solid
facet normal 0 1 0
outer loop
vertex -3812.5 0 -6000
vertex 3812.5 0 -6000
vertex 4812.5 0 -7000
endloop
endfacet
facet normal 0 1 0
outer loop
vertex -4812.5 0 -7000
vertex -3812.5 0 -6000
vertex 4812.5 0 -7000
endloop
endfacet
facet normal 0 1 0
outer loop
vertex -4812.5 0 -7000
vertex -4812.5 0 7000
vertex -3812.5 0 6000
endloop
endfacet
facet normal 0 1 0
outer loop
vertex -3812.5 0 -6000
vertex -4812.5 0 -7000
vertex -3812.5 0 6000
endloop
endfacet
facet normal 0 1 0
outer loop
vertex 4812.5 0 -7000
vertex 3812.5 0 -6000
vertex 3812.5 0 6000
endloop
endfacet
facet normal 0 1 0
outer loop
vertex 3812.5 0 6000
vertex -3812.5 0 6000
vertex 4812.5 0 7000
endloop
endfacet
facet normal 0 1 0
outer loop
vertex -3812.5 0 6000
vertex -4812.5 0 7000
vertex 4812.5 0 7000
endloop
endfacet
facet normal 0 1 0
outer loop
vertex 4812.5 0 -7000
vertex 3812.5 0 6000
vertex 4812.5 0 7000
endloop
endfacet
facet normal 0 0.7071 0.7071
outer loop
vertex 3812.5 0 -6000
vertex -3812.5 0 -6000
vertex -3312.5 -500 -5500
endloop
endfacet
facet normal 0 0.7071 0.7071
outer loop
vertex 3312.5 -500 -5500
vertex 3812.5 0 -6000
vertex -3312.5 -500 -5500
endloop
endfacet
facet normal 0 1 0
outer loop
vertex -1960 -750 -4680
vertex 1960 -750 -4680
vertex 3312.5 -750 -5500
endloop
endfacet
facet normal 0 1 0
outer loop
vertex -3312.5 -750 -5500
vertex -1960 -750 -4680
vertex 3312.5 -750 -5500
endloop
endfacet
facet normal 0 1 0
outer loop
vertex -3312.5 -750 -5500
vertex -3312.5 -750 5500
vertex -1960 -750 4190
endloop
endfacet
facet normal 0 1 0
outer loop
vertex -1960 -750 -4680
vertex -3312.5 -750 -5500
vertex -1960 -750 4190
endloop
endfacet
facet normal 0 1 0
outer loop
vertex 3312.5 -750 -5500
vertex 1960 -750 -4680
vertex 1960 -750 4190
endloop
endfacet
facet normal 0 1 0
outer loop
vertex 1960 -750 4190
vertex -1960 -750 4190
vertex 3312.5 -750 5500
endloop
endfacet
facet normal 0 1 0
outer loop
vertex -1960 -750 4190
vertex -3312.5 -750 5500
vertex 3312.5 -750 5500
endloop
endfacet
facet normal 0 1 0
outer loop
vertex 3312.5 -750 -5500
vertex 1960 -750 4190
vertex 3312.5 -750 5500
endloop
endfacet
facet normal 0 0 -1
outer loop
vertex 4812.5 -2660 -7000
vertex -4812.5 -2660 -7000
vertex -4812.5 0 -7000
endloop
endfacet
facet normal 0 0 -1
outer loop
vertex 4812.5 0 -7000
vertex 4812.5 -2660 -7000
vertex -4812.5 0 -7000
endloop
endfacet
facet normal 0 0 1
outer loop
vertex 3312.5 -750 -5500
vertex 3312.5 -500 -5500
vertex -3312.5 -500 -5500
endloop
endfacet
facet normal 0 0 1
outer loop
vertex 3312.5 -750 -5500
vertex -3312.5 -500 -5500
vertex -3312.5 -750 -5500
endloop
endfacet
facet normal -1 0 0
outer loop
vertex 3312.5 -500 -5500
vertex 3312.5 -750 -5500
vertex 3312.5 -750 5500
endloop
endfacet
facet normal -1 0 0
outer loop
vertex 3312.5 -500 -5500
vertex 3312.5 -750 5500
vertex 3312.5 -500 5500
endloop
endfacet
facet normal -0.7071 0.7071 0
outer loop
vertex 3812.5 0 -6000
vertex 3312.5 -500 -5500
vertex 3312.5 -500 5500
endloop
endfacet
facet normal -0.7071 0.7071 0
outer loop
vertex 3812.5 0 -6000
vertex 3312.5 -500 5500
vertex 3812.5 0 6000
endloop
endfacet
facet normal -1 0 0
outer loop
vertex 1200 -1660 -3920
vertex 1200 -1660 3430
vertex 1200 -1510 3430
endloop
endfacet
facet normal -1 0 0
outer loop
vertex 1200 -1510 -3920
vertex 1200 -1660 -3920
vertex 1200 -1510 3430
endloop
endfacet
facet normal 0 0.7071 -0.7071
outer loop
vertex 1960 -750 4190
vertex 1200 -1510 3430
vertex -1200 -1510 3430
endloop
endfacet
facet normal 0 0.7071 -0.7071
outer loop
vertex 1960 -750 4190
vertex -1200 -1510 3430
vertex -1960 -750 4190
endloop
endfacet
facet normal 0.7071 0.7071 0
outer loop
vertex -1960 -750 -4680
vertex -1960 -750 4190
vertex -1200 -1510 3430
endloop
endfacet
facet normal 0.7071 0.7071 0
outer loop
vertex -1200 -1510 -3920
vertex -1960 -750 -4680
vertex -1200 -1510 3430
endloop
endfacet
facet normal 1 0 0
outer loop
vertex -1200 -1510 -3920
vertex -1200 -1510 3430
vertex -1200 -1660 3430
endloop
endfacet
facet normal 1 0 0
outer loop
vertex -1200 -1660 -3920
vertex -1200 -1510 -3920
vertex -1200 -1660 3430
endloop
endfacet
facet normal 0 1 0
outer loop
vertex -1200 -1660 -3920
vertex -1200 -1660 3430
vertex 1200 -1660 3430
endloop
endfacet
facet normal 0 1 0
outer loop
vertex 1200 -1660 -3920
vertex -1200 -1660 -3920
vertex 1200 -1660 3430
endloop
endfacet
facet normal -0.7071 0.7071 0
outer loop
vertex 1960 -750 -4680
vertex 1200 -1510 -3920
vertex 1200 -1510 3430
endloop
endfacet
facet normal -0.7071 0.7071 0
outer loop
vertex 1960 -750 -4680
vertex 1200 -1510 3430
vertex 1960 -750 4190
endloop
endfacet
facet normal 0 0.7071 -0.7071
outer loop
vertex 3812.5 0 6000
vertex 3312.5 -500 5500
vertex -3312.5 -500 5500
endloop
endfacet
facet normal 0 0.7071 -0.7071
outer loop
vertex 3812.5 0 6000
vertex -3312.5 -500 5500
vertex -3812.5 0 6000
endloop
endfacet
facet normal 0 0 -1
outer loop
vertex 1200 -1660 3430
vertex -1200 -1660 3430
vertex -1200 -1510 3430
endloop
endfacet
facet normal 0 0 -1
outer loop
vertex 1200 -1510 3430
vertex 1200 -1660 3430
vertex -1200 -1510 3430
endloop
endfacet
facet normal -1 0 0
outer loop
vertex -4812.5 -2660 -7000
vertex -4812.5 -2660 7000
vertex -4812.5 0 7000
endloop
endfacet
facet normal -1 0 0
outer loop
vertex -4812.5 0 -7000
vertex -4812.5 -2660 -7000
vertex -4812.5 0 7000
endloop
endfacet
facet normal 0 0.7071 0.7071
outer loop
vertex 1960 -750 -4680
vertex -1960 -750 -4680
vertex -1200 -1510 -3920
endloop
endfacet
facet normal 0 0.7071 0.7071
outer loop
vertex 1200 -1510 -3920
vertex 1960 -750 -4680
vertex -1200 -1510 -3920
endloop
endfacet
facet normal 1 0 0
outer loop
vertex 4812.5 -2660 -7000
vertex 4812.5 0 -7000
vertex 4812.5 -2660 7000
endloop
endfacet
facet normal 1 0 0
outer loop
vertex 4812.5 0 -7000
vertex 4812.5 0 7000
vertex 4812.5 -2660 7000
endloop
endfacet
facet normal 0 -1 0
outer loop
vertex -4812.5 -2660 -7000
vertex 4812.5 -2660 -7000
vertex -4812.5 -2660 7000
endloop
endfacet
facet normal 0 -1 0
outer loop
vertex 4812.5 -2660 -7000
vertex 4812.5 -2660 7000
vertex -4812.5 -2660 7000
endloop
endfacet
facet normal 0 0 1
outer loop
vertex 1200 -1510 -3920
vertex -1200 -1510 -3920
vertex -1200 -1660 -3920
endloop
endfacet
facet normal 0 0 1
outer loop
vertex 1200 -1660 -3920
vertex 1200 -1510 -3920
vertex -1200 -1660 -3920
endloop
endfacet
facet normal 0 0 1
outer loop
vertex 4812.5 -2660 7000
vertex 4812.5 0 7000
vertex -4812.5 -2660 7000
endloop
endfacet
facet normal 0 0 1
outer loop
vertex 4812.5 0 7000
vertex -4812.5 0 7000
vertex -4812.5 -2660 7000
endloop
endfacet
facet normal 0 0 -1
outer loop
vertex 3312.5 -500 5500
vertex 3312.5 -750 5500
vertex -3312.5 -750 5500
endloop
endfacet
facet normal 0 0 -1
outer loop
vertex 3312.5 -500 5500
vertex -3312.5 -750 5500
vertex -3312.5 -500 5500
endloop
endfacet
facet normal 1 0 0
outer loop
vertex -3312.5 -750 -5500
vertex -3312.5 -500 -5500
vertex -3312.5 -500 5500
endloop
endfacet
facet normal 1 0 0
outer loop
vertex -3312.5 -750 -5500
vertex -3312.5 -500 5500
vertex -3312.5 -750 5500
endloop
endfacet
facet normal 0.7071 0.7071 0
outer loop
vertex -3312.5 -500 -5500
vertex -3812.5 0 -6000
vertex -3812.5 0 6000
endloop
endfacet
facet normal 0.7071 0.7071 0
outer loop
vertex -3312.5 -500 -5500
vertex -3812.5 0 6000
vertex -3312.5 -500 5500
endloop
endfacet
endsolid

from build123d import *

# Parameters (mm, degrees)
EXTRUDE_1_DEPTH = 7000
EXTRUDE_2_REACH = 12196.926


with BuildPart() as part:
    # Эскиз1 → Бобышка-Вытянуть1 (new body)
    with BuildSketch(Plane.XY):
        Polygon((-1200, -1660), (1200, -1660), (1200, -1510), (1960, -750), (3312.5, -750), (3312.5, -500), (3812.5, 0), (4812.5, 0), (4812.5, -2660), (-4812.5, -2660), (-4812.5, 0), (-3812.5, 0), (-3312.5, -500), (-3312.5, -750), (-1960, -750), (-1200, -1510), align=None)
    extrude(amount=EXTRUDE_1_DEPTH)

    # Зеркальное отражение2: part across plane


with BuildPart() as part_1:
    add(part.part)
    add(part.part.mirror(Plane(origin=(0, 0, 0), x_dir=(1, 0, 0), z_dir=(0, 0, -1))))

    # Бобышка-Вытянуть2: up to this face of the body (flat: up to its plane)
    extrude_2_end = Plane(part_1.part.faces().sort_by_distance((4812.5, -1330, 0))[0])
    # Эскиз3 → Бобышка-Вытянуть2 (add, up to the picked face)
    with BuildSketch(Plane.ZY.offset(4812.5), mode=Mode.PRIVATE) as extrude_2_sk1:
        Polygon((-3920, -1660), (3430, -1660), (3430, -1510), (4190, -750), (5500, -750), (5500, -500), (6000, 0), (7000, 0), (7000, -2660), (-7000, -2660), (-7000, 0), (-6000, 0), (-5500, -500), (-5500, -750), (-4680, -750), (-3920, -1510), align=None)
    extrude_2_tool1 = split(extrude(extrude_2_sk1.sketch, amount=-EXTRUDE_2_REACH, mode=Mode.PRIVATE), bisect_by=extrude_2_end, keep=Keep.BOTH, mode=Mode.PRIVATE)
    add(extrude_2_tool1.solids().sort_by(Axis((-4812.5, -1758.162956, 82.900381), (1, 0, 0)))[0])


solid = part_1.part
